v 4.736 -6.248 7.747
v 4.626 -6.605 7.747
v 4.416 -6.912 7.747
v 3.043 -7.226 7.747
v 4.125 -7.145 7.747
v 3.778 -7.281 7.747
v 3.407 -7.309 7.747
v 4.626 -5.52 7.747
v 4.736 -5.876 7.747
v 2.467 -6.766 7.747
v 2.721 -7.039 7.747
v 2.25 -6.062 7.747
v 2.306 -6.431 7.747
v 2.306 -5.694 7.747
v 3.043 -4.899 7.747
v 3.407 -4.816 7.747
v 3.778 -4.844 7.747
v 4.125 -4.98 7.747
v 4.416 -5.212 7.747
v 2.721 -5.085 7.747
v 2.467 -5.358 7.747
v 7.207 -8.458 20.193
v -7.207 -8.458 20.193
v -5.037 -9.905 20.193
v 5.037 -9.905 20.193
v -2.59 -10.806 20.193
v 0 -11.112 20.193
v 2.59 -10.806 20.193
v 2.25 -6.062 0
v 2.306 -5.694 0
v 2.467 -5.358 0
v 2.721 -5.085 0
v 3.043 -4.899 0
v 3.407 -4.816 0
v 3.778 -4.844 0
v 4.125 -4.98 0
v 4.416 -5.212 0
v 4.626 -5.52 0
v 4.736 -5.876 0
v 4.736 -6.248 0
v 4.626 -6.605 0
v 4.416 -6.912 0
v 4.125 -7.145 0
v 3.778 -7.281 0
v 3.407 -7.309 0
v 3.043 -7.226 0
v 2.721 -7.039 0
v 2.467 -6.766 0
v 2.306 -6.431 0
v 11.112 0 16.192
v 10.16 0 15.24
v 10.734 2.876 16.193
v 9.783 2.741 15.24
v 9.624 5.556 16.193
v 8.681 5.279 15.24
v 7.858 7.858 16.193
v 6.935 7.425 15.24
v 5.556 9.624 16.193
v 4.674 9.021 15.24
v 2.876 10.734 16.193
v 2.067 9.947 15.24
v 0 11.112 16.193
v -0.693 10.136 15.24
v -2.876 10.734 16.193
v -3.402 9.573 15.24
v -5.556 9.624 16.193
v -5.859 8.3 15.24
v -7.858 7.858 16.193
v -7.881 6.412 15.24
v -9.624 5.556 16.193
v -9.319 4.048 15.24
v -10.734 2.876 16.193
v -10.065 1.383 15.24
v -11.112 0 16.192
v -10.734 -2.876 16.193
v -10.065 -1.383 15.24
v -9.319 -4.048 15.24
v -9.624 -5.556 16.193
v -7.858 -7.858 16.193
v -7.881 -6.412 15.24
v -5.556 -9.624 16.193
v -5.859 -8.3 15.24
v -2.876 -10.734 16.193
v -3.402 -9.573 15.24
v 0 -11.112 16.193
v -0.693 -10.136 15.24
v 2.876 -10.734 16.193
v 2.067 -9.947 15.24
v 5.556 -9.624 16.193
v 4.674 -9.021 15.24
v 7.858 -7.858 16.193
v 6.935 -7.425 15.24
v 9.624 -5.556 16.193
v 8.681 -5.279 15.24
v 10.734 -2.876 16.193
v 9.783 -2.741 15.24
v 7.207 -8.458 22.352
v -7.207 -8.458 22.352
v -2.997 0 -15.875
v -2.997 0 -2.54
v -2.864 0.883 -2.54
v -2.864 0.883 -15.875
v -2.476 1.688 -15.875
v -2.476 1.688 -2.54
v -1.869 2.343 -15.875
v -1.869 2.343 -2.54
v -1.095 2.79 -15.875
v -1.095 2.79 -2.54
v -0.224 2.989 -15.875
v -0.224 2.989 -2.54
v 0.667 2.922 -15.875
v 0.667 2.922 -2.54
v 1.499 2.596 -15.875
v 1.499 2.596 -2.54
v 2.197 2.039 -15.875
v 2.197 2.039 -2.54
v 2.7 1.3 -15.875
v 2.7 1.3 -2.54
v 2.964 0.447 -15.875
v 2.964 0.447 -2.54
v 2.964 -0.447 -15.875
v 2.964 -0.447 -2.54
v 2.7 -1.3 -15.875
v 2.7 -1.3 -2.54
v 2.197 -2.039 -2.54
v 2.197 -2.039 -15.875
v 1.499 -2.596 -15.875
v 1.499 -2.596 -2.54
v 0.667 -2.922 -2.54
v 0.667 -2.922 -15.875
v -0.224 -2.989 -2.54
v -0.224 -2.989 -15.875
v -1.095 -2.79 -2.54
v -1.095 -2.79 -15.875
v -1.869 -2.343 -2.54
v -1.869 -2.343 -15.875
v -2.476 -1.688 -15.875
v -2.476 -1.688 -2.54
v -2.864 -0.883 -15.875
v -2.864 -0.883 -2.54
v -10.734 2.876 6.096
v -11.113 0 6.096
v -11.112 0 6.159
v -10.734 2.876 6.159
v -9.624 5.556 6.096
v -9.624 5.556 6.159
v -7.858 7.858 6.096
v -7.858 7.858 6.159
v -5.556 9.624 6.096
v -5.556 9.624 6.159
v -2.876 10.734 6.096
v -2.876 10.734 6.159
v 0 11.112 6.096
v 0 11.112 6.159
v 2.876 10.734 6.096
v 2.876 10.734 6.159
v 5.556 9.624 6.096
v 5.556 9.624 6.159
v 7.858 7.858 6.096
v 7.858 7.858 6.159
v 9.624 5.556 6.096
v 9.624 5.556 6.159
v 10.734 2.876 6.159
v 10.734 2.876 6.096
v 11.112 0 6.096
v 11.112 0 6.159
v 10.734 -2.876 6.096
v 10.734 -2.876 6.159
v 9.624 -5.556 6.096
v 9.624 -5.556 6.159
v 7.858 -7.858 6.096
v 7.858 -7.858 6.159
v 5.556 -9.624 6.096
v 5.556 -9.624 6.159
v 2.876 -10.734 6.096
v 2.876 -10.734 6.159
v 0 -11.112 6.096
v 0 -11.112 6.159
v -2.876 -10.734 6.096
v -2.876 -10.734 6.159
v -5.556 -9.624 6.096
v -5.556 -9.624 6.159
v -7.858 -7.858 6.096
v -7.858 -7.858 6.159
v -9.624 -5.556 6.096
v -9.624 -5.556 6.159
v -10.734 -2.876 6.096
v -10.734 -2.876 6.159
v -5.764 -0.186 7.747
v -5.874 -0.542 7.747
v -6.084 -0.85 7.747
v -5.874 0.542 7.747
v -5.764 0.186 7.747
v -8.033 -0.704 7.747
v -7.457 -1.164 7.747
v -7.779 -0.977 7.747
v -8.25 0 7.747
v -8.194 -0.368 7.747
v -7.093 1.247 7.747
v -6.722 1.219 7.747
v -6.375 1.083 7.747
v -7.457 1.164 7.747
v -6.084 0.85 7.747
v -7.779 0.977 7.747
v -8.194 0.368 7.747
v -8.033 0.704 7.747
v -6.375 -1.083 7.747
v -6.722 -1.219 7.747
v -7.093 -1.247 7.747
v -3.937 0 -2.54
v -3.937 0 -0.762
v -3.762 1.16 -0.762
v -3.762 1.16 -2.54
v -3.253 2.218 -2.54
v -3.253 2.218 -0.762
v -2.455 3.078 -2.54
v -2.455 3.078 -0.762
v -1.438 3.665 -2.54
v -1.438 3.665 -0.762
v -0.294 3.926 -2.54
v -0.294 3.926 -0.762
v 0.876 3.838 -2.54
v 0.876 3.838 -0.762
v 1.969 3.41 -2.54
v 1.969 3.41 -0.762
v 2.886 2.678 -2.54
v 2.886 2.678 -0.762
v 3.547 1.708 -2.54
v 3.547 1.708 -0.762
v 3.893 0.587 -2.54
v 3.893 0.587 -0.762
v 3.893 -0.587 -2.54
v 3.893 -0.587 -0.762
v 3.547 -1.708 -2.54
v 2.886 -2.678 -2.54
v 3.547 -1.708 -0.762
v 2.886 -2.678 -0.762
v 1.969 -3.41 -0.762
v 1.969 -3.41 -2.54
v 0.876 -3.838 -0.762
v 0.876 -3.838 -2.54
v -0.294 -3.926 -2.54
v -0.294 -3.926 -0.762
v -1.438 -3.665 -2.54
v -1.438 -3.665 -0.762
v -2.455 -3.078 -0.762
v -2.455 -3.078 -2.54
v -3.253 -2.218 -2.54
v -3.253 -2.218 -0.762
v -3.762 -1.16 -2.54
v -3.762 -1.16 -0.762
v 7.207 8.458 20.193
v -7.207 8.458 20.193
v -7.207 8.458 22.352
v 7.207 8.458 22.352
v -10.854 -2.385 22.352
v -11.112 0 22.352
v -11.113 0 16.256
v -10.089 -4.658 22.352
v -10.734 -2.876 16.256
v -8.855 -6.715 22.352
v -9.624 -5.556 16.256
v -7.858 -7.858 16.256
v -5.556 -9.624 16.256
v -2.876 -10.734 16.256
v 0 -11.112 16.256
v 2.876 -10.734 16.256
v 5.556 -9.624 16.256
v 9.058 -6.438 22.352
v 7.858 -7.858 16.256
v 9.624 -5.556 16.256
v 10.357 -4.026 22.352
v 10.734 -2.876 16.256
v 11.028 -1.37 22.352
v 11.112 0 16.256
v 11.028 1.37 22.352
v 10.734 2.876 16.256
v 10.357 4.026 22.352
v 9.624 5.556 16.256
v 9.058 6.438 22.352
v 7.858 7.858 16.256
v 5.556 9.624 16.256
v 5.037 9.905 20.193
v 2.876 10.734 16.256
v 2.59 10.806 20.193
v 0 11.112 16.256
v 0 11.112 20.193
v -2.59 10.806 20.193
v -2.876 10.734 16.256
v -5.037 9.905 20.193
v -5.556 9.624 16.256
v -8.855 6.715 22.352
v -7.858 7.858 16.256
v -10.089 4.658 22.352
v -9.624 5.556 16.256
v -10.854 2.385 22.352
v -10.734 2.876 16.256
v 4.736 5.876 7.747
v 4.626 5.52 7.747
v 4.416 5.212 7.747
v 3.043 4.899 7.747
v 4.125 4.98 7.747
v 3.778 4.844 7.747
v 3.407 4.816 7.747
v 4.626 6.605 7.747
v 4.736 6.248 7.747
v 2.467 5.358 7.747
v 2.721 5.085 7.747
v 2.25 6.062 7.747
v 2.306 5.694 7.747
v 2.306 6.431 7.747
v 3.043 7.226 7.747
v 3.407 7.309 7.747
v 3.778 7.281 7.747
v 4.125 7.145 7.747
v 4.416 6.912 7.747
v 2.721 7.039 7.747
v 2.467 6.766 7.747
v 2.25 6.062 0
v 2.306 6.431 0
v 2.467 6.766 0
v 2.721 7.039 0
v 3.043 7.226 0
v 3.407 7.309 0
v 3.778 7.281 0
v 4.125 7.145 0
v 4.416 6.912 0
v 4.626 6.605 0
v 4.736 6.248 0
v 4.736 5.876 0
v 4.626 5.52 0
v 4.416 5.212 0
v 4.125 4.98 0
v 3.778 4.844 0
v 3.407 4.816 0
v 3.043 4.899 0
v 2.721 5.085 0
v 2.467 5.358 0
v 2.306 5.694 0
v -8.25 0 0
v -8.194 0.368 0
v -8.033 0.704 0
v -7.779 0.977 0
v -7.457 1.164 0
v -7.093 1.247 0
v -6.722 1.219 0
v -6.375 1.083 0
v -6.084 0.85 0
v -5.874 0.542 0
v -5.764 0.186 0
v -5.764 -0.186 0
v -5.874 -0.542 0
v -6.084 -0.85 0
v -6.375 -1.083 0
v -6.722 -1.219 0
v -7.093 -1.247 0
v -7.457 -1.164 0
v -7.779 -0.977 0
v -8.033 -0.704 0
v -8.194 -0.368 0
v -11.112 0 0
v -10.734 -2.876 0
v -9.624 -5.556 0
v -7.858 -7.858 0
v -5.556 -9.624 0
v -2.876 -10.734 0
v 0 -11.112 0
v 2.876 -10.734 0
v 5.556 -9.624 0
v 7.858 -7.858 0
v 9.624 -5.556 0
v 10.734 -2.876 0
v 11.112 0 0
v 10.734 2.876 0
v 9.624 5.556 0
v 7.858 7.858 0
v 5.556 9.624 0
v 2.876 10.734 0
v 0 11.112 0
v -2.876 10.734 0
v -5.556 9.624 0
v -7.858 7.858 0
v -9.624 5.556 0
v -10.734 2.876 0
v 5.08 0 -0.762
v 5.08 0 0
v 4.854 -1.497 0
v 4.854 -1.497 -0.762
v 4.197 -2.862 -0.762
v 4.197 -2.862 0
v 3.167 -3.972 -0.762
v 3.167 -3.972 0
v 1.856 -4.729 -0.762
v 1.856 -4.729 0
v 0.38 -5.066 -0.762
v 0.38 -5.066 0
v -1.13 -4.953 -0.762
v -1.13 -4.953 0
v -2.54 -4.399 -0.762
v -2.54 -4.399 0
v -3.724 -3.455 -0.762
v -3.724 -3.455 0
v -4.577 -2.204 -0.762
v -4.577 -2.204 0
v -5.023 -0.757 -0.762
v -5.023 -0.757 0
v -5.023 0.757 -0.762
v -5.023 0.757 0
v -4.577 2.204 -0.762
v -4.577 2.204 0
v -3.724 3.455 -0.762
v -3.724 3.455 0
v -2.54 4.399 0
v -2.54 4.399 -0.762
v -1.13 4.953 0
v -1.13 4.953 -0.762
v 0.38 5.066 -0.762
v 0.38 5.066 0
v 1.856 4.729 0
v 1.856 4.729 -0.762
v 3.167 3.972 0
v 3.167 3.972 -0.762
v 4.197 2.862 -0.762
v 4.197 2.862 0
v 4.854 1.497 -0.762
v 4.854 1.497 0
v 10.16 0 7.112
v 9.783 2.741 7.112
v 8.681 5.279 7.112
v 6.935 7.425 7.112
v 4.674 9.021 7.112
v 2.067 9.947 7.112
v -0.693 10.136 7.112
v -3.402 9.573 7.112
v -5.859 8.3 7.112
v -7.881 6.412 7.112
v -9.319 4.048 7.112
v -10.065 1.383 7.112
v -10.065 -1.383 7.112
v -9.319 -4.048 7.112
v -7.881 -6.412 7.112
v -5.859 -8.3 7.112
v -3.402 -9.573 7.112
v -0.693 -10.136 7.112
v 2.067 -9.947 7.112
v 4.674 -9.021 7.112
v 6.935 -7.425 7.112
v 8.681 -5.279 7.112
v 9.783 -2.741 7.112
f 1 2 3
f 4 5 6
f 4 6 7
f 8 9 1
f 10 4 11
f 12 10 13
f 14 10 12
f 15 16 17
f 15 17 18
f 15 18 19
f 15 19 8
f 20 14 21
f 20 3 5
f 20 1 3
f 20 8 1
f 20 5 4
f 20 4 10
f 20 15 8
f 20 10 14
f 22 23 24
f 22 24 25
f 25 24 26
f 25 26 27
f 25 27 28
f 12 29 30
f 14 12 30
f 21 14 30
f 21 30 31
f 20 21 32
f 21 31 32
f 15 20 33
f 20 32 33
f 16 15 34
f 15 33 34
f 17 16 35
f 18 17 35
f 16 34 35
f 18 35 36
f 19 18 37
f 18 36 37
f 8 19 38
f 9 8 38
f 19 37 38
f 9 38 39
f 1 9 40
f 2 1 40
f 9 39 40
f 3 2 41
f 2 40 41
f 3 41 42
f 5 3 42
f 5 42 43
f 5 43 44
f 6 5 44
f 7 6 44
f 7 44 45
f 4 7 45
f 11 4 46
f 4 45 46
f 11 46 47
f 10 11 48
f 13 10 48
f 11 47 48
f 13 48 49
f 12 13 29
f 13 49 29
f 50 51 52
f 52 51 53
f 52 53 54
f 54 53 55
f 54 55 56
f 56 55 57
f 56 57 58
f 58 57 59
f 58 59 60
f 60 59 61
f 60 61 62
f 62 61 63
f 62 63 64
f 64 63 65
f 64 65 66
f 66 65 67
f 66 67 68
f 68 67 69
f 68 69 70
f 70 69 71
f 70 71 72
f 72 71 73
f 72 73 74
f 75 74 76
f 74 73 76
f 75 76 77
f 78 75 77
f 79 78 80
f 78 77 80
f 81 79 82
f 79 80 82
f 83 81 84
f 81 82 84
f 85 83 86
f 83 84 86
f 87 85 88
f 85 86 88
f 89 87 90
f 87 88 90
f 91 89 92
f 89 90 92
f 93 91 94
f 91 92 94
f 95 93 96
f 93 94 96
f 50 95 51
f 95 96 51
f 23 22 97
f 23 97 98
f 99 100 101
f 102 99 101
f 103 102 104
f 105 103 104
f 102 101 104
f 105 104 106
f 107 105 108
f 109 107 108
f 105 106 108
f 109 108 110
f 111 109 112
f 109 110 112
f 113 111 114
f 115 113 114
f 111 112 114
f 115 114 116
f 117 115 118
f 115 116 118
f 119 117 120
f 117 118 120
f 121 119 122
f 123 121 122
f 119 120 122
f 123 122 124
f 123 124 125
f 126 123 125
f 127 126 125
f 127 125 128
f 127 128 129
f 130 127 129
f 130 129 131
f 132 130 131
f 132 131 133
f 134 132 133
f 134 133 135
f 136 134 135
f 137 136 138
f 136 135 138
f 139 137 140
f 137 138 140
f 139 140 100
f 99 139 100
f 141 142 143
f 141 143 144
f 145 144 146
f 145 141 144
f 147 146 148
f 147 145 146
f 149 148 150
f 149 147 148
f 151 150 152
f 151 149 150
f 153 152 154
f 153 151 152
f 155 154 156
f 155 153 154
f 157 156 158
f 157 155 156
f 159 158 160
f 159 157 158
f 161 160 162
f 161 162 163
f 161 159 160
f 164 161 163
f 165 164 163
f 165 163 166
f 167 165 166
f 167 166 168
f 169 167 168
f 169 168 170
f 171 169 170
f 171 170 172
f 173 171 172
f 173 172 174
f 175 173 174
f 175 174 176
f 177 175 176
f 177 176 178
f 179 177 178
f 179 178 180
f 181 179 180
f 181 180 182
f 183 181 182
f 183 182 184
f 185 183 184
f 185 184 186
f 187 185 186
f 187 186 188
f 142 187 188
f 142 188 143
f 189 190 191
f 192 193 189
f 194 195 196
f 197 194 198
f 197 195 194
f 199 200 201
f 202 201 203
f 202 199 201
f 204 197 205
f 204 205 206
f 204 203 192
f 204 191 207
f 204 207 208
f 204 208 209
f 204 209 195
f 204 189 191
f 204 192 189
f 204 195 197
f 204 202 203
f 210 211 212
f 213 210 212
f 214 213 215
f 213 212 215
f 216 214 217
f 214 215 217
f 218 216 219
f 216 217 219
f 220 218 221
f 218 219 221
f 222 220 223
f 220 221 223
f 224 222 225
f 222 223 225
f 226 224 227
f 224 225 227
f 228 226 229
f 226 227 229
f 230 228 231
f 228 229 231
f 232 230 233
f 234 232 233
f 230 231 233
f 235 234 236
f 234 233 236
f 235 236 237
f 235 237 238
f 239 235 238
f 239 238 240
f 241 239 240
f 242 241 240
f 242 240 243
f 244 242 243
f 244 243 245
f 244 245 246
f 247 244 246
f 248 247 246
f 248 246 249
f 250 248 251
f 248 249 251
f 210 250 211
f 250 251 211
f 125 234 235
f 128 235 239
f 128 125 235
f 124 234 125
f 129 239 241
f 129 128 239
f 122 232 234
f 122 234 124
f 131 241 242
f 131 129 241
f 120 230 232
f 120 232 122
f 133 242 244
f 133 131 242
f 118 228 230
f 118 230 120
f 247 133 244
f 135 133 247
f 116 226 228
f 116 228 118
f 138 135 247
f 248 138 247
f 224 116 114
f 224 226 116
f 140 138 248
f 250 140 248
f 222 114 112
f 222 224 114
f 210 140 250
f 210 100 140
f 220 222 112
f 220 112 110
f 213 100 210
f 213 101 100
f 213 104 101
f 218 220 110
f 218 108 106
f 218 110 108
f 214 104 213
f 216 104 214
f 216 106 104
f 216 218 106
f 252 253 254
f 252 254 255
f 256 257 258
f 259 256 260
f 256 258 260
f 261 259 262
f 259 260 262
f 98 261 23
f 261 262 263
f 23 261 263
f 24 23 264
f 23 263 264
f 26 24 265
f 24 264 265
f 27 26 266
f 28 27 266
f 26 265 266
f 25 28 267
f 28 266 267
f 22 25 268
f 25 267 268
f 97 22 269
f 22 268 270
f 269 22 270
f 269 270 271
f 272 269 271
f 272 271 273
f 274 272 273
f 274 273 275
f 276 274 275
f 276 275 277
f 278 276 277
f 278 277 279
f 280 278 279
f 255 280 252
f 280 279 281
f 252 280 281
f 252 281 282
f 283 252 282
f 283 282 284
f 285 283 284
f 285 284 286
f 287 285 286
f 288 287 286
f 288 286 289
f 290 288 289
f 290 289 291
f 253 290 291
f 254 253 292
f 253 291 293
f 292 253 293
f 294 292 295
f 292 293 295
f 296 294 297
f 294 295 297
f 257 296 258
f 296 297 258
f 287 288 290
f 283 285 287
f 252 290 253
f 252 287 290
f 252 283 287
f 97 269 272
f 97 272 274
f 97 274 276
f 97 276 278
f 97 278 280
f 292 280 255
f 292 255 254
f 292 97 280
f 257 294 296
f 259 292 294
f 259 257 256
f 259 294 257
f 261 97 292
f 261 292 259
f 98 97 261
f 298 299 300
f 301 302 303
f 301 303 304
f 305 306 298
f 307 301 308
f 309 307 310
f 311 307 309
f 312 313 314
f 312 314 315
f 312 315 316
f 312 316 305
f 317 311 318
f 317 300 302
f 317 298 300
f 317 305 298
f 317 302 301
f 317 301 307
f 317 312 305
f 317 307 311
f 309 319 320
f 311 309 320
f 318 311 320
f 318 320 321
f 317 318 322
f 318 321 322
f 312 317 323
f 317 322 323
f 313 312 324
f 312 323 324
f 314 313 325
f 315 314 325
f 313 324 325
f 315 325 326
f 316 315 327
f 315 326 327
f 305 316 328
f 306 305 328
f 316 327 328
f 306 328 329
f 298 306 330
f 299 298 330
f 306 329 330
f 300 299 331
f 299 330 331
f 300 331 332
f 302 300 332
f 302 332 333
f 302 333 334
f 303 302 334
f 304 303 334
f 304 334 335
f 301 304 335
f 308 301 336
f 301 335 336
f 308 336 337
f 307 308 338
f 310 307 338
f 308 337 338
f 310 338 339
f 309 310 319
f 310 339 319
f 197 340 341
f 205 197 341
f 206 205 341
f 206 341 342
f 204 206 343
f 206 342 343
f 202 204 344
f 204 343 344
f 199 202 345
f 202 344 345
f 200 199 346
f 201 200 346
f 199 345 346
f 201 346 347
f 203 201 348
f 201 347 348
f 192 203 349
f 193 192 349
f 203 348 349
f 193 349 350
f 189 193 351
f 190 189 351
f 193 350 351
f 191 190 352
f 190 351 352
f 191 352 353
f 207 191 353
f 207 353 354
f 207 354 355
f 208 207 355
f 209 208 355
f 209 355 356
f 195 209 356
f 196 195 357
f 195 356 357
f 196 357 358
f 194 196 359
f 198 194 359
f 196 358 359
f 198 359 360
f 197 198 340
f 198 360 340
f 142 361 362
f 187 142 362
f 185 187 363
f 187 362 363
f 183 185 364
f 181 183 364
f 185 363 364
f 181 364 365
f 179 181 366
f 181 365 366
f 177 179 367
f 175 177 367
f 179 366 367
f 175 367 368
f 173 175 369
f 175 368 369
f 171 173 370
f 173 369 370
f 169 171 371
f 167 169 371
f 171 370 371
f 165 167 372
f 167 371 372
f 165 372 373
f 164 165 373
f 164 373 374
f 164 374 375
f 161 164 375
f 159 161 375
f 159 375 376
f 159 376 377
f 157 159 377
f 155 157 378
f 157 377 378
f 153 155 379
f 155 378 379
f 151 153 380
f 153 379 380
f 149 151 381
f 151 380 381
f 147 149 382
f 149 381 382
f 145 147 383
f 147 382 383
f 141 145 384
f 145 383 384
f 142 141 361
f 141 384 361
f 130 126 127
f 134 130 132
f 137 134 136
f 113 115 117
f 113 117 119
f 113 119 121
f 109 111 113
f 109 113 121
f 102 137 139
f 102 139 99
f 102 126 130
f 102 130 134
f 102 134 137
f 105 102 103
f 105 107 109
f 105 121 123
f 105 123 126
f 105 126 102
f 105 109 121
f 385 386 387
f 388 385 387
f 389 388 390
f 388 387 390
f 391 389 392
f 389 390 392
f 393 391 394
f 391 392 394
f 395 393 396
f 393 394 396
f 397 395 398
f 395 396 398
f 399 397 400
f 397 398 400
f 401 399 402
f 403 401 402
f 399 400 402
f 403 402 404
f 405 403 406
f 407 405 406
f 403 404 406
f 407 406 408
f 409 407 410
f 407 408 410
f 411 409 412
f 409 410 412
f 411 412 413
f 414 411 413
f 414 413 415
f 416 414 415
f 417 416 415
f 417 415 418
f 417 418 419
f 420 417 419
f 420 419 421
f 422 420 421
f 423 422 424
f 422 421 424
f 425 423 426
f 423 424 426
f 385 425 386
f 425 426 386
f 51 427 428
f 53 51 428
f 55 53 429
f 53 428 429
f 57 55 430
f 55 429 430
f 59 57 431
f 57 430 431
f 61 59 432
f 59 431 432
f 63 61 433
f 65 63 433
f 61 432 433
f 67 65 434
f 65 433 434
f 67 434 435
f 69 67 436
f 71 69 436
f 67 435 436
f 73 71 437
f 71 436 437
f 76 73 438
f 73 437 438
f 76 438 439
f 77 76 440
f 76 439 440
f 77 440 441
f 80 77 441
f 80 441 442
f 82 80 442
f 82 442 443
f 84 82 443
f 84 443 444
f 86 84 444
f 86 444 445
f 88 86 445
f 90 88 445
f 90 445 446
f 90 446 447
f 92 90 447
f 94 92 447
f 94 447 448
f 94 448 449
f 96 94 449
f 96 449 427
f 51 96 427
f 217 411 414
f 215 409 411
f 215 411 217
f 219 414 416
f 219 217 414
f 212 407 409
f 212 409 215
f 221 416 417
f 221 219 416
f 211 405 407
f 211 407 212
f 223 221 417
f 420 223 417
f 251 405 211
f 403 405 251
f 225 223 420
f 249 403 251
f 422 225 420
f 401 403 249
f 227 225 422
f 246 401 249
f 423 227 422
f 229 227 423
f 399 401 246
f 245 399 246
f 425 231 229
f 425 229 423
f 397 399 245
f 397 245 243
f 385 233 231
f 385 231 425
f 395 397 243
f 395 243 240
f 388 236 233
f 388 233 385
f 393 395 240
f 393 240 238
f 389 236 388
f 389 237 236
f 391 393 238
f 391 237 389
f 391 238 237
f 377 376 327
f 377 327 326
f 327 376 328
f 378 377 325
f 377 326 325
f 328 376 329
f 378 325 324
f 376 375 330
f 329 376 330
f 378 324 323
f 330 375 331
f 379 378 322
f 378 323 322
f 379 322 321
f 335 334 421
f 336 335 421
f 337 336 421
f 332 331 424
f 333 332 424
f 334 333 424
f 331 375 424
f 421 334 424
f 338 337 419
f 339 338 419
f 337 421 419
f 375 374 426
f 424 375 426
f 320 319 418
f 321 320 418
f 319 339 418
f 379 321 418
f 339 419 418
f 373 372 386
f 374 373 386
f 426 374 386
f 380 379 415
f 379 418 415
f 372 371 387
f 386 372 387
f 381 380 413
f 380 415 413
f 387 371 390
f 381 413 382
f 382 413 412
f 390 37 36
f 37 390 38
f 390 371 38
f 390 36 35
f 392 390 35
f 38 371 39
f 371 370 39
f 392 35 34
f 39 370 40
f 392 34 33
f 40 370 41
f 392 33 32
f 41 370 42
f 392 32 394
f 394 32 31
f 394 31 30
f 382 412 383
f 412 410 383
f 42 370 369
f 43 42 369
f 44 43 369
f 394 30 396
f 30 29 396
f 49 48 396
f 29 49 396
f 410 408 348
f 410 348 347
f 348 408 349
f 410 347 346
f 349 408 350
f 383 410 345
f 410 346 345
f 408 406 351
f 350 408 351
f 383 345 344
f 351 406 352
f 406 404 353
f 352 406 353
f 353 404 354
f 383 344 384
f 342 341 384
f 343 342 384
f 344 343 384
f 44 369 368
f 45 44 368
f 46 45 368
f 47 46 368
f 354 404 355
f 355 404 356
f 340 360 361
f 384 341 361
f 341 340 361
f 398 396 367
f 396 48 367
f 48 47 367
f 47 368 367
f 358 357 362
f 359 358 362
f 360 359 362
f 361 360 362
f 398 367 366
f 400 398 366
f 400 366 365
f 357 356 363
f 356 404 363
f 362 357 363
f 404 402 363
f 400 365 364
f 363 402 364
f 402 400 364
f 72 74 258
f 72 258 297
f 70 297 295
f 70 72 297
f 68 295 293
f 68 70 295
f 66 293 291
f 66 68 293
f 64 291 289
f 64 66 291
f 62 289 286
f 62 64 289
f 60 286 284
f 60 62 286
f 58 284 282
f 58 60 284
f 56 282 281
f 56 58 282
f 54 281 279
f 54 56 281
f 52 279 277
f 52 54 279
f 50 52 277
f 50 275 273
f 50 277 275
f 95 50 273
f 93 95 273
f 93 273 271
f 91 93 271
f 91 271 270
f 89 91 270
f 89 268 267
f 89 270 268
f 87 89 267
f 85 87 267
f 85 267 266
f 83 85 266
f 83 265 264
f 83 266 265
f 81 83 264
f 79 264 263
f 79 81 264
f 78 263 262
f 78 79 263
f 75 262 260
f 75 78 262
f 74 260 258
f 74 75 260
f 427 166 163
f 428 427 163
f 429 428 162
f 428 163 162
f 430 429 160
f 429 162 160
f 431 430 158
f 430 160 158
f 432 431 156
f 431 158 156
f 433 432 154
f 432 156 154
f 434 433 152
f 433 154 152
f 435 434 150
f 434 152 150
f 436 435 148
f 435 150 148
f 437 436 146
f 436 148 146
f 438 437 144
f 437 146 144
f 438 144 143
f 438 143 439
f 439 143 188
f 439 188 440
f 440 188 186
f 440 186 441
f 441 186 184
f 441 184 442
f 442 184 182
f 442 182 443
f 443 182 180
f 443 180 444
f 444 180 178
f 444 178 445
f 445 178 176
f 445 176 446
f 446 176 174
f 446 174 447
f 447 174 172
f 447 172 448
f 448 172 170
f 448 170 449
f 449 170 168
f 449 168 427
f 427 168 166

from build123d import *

# Parameters (mm, degrees)
SKETCH1_R           = 11.1125
BOSS_EXTRUDE1_DEPTH = 6.096
SKETCH2_R           = 10.16
BOSS_EXTRUDE2_DEPTH = 10.16
SKETCH3_R           = 11.1125
BOSS_EXTRUDE3_DEPTH = 6.096
CUT_EXTRUDE1_START  = -2.159
CUT_EXTRUDE1_DEPTH  = 2.159
CHAMFER1_SIZE       = 1.016
SKETCH5_R           = 5.08
BOSS_EXTRUDE4_DEPTH = 0.762
SKETCH6_R           = 3.937
BOSS_EXTRUDE5_DEPTH = 1.778
SKETCH7_R           = 2.9972
BOSS_EXTRUDE6_DEPTH = 13.335
SKETCH8_R           = 1.25
CUT_EXTRUDE2_DEPTH  = 7.747


with BuildPart() as part:
    # Sketch1 → Boss-Extrude1 (new body)
    with BuildSketch(Plane.XY):
        with Locations(Location((0, 0, 0), (0, 0, 180))):
            Circle(SKETCH1_R)
    extrude(amount=BOSS_EXTRUDE1_DEPTH)

    # Sketch2 → Boss-Extrude2 (add)
    with BuildSketch(Plane.XY.offset(6.096)):
        Circle(SKETCH2_R)
    extrude(amount=BOSS_EXTRUDE2_DEPTH)

    # Sketch3 → Boss-Extrude3 (add)
    with BuildSketch(Plane.XY.offset(16.256)):
        with Locations(Location((0, 0, 0), (0, 0, 180))):
            Circle(SKETCH3_R)
    extrude(amount=BOSS_EXTRUDE3_DEPTH)

    # Sketch4 → Cut-Extrude1 (cut)
    with BuildSketch(Plane.XY.offset(22.352).offset(CUT_EXTRUDE1_START)):
        with BuildLine():
            ThreePointArc((7.207392664, 8.4582), (0, 11.1125), (-7.207392664, 8.4582))
            Line((-7.207392664, 8.4582), (7.207392664, 8.4582))
        make_face()
        with BuildLine():
            Line((7.207392664, -8.4582), (-7.207392664, -8.4582))
            ThreePointArc((-7.207392664, -8.4582), (0, -11.1125), (7.207392664, -8.4582))
        make_face()
    extrude(amount=CUT_EXTRUDE1_DEPTH, mode=Mode.SUBTRACT)

    # Chamfer1
    # the kernel refuses this chamfer: 1.016 mm, written as the material it adds along each edge
    with BuildSketch(Plane(origin=(0, 0, 6.096), x_dir=(1, 0, 0), z_dir=(0, -1, 0))) as chamfer1_piece_1_section:
        Polygon((10.16, CHAMFER1_SIZE), (10.16 + CHAMFER1_SIZE, 0), (10.16, 0), align=None)
    chamfer1_piece_1 = revolve(axis=Axis((0, 0, 6.096), (0, 0, 1)), mode=Mode.PRIVATE)
    chamfer1_piece_1 = chamfer1_piece_1 & Plane(origin=(0, 0, 6.626545895), x_dir=(-1, 0, 0), z_dir=(0, 0, -1)) * Cylinder(11.1125, 45, mode=Mode.PRIVATE)
    add(chamfer1_piece_1)
    with BuildSketch(Plane(origin=(0, 0, 16.256), x_dir=(1, 0, 0), z_dir=(0, -1, 0))) as chamfer1_piece_2_section:
        Polygon((10.16 + CHAMFER1_SIZE, 0), (10.16, -CHAMFER1_SIZE), (10.16, 0), align=None)
    chamfer1_piece_2 = revolve(axis=Axis((0, 0, 16.256), (0, 0, 1)), mode=Mode.PRIVATE)
    chamfer1_piece_2 = chamfer1_piece_2 & Plane(origin=(0, 0, 15.725454105), x_dir=(-1, 0, 0), z_dir=(0, 0, -1)) * Cylinder(11.1125, 45, mode=Mode.PRIVATE)
    add(chamfer1_piece_2)

    # Sketch5 → Boss-Extrude4 (add)
    with BuildSketch(Plane(origin=(0, 0, 0), x_dir=(-1, 0, 0), z_dir=(0, 0, -1))):
        with Locations(Location((0, 0, 0), (0, 0, 180))):
            Circle(SKETCH5_R)
    extrude(amount=BOSS_EXTRUDE4_DEPTH)

    # Sketch6 → Boss-Extrude5 (add)
    with BuildSketch(Plane(origin=(0, 0, -0.762), x_dir=(-1, 0, 0), z_dir=(0, 0, -1))):
        Circle(SKETCH6_R)
    extrude(amount=BOSS_EXTRUDE5_DEPTH)

    # Sketch7 → Boss-Extrude6 (add)
    with BuildSketch(Plane(origin=(0, 0, -2.54), x_dir=(-1, 0, 0), z_dir=(0, 0, -1))):
        Circle(SKETCH7_R)
    extrude(amount=BOSS_EXTRUDE6_DEPTH)

    # Sketch8 → Cut-Extrude2 (cut)
    with BuildSketch(Plane(origin=(0, 0, 0), x_dir=(-1, 0, 0), z_dir=(0, 0, -1))):
        with Locations((7, 0)):
            Circle(SKETCH8_R)
        with Locations((-3.5, -6.062177826)):
            Circle(SKETCH8_R)
        with Locations((-3.5, 6.062177826)):
            Circle(SKETCH8_R)
    extrude(amount=-CUT_EXTRUDE2_DEPTH, mode=Mode.SUBTRACT)


solid = part.part
